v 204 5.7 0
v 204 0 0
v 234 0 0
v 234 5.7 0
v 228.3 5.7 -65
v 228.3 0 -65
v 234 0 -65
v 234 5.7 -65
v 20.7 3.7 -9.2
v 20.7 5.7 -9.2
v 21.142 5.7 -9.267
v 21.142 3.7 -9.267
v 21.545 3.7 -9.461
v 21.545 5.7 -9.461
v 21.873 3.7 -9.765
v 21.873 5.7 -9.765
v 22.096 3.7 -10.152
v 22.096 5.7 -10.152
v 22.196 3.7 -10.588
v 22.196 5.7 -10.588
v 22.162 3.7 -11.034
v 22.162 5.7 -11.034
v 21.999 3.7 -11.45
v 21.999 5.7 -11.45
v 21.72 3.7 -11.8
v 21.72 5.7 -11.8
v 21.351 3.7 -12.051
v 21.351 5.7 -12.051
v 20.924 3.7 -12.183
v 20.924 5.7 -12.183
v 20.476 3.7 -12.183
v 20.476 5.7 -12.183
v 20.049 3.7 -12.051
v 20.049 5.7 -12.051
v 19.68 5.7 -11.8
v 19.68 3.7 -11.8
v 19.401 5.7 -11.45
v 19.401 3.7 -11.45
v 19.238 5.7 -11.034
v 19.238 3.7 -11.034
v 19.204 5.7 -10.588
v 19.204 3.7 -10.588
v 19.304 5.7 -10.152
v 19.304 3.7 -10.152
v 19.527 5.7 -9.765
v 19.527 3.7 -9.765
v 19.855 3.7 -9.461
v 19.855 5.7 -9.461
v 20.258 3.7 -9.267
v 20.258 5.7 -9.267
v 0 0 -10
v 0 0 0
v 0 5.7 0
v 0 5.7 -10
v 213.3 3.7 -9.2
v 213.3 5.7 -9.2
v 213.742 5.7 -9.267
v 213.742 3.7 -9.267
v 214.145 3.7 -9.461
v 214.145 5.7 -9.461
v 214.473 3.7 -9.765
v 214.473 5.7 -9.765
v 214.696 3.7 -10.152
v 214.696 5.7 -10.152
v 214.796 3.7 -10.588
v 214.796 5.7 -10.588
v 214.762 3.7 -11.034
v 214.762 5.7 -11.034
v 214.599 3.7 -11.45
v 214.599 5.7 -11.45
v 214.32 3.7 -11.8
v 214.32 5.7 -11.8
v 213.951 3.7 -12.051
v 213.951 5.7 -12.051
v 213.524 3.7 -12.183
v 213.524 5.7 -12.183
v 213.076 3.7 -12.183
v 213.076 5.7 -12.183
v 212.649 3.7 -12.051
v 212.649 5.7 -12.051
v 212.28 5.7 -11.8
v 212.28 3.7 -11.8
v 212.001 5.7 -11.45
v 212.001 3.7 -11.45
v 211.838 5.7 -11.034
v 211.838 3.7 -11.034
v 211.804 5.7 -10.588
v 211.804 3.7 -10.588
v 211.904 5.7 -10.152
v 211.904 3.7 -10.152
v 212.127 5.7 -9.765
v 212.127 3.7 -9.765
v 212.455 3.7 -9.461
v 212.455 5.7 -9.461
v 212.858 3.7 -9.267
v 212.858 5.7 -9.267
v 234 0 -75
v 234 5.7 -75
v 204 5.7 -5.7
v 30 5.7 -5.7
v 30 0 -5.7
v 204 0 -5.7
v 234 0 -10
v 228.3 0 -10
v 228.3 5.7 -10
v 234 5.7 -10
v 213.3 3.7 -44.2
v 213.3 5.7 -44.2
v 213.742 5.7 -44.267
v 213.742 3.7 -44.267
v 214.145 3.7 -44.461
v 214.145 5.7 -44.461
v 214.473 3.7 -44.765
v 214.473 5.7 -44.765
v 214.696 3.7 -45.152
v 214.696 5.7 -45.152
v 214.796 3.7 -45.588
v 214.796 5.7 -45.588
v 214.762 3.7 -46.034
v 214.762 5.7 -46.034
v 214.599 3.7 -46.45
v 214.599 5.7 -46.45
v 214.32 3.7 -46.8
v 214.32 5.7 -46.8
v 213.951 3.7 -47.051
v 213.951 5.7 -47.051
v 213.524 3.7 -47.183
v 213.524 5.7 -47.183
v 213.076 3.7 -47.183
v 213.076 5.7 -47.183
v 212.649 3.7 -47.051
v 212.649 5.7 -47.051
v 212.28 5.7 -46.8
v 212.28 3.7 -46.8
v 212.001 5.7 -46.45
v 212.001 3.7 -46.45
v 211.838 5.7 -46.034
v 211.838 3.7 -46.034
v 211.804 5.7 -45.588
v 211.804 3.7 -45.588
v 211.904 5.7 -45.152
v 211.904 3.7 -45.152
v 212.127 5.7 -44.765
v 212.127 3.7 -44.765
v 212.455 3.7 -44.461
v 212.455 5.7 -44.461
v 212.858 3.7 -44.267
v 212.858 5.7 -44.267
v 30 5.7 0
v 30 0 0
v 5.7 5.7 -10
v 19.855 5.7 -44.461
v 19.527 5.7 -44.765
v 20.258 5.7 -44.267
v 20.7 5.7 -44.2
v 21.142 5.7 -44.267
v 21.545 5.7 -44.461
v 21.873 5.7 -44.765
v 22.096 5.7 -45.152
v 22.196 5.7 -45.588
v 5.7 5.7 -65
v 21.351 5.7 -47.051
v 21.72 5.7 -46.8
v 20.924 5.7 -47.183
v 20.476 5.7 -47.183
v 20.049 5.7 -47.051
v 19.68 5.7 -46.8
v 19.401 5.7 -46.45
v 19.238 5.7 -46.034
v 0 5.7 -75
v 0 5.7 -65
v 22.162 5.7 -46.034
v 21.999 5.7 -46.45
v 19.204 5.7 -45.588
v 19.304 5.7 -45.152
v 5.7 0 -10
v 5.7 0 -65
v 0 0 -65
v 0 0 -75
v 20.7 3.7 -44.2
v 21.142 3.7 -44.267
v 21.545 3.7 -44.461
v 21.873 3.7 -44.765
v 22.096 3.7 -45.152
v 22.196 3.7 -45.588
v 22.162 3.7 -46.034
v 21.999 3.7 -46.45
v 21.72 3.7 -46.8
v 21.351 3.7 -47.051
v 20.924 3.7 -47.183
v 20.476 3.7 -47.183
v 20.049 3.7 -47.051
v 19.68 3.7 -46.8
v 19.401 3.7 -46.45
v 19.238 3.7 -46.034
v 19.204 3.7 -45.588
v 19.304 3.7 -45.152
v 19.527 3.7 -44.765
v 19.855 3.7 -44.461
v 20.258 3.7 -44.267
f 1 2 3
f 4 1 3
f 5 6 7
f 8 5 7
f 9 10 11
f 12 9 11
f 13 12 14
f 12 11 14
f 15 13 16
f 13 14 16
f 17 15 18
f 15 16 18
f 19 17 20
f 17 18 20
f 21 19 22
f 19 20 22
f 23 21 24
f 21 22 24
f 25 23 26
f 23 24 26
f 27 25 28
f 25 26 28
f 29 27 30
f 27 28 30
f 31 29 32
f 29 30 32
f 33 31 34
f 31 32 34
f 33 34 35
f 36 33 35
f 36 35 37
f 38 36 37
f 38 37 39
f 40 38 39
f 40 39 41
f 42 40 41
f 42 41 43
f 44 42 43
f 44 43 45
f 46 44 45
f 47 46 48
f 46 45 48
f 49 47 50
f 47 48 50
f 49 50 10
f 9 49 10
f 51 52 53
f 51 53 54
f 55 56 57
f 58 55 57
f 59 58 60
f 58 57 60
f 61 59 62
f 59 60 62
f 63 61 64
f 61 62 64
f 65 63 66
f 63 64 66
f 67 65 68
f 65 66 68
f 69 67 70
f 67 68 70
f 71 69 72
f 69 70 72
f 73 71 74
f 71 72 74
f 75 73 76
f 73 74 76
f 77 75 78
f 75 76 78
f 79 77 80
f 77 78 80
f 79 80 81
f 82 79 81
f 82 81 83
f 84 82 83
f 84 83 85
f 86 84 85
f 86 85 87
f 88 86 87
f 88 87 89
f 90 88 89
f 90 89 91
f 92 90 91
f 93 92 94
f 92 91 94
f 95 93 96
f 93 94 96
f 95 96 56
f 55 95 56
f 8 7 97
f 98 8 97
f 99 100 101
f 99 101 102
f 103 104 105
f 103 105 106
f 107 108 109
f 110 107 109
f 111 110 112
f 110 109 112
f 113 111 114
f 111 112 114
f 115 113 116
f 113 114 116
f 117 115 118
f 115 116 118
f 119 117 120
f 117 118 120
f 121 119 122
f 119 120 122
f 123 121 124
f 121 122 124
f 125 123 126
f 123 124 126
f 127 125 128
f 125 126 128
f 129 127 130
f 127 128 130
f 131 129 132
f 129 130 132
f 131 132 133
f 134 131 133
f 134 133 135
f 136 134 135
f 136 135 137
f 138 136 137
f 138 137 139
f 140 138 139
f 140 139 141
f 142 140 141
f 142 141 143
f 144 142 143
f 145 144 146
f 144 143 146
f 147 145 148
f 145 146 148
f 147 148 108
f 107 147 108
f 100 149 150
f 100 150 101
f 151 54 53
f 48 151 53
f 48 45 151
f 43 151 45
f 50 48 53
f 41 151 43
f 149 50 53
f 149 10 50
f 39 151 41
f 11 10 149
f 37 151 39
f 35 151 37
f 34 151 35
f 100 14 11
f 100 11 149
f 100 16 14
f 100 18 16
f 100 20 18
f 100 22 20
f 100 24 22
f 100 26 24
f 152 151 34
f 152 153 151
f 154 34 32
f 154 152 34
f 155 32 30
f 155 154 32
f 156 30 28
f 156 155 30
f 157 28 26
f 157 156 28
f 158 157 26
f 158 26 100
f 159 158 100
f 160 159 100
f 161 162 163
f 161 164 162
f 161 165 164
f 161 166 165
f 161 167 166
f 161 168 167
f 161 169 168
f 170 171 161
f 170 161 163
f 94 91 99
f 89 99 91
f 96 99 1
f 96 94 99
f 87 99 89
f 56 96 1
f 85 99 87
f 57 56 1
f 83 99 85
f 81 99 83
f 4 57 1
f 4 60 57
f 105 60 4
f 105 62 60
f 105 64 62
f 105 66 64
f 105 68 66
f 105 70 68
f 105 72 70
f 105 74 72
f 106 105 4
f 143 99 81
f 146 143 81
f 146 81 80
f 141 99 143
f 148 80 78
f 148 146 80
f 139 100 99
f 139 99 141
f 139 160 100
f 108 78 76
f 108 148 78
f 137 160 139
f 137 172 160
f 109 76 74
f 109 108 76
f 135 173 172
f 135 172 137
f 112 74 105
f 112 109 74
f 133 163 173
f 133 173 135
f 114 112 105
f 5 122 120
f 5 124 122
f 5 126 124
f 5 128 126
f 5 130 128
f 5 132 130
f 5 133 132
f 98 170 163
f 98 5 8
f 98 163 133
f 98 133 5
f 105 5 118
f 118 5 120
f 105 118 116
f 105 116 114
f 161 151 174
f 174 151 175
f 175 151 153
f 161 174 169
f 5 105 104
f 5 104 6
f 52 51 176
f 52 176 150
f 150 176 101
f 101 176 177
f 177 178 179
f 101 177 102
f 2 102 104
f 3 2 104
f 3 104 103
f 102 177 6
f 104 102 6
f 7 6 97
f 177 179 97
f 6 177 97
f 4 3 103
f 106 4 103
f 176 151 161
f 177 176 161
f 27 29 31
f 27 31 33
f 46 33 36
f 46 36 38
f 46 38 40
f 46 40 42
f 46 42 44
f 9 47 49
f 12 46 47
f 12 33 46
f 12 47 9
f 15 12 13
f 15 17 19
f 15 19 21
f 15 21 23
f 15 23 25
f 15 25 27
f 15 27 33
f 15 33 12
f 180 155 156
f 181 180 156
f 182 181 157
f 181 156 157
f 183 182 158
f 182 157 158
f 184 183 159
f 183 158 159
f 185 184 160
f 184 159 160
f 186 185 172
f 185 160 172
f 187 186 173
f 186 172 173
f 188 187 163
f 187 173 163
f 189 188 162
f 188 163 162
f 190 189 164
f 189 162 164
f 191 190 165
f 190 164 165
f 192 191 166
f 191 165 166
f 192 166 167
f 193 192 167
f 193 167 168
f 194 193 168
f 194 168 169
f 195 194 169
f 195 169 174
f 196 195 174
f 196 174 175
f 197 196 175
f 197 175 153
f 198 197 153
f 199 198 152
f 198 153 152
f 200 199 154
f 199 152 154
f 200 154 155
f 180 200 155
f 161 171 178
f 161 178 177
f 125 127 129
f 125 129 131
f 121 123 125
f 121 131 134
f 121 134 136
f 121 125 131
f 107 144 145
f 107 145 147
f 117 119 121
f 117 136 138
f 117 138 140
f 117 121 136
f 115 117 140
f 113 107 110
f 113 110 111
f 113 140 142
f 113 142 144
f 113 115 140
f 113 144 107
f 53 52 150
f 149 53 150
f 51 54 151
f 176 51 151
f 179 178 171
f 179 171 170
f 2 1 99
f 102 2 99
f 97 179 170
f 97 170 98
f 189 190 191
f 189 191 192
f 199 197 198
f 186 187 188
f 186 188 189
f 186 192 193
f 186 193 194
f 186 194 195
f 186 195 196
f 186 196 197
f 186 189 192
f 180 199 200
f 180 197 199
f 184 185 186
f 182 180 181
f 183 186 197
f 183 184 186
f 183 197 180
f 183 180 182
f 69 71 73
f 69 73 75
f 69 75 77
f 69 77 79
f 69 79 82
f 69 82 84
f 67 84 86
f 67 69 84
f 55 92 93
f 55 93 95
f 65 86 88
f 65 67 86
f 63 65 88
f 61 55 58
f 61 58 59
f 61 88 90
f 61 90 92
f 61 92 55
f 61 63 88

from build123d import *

# Parameters (mm, degrees)
SKETCH1_W           = 234
SKETCH1_H           = 75
BOSS_EXTRUDE1_DEPTH = 5.7
SKETCH2_W           = 5.7
SKETCH2_H           = 55
CUT_EXTRUDE1_DEPTH  = 5.7
SKETCH3_W           = 174
SKETCH3_H           = 5.7
CUT_EXTRUDE2_DEPTH  = 5.7
SKETCH4_R           = 1.5
CUT_EXTRUDE3_DEPTH  = 2


with BuildPart() as part:
    # Sketch1 → Boss-Extrude1 (new body)
    with BuildSketch(Plane(origin=(0, 0, 0), x_dir=(1, 0, 0), z_dir=(0, 1, 0))):
        with Locations((117, 37.5)):
            Rectangle(SKETCH1_W, SKETCH1_H)
    extrude(amount=BOSS_EXTRUDE1_DEPTH)

    # Sketch2 → Cut-Extrude1 (cut)
    with BuildSketch(Plane(origin=(0, 5.7, 0), x_dir=(1, 0, 0), z_dir=(0, 1, 0))):
        with Locations((2.85, 37.5)):
            Rectangle(SKETCH2_W, SKETCH2_H)
        with Locations((231.15, 37.5)):
            Rectangle(SKETCH2_W, SKETCH2_H)
    extrude(amount=-CUT_EXTRUDE1_DEPTH, mode=Mode.SUBTRACT)

    # Sketch3 → Cut-Extrude2 (cut)
    with BuildSketch(Plane(origin=(0, 5.7, 0), x_dir=(1, 0, 0), z_dir=(0, 1, 0))):
        with Locations((117, 2.85)):
            Rectangle(SKETCH3_W, SKETCH3_H)
    extrude(amount=-CUT_EXTRUDE2_DEPTH, mode=Mode.SUBTRACT)

    # Sketch4 → Cut-Extrude3 (cut)
    with BuildSketch(Plane(origin=(0, 5.7, 0), x_dir=(1, 0, 0), z_dir=(0, 1, 0))):
        with Locations(Location((213.3, 45.7, 0), (0, 0, 270))):
            Circle(SKETCH4_R)
        with Locations(Location((213.3, 10.7, 0), (0, 0, 270))):
            Circle(SKETCH4_R)
        with Locations(Location((20.7, 10.7, 0), (0, 0, 270))):
            Circle(SKETCH4_R)
        with Locations(Location((20.7, 45.7, 0), (0, 0, 270))):
            Circle(SKETCH4_R)
    extrude(amount=-CUT_EXTRUDE3_DEPTH, mode=Mode.SUBTRACT)


solid = part.part
